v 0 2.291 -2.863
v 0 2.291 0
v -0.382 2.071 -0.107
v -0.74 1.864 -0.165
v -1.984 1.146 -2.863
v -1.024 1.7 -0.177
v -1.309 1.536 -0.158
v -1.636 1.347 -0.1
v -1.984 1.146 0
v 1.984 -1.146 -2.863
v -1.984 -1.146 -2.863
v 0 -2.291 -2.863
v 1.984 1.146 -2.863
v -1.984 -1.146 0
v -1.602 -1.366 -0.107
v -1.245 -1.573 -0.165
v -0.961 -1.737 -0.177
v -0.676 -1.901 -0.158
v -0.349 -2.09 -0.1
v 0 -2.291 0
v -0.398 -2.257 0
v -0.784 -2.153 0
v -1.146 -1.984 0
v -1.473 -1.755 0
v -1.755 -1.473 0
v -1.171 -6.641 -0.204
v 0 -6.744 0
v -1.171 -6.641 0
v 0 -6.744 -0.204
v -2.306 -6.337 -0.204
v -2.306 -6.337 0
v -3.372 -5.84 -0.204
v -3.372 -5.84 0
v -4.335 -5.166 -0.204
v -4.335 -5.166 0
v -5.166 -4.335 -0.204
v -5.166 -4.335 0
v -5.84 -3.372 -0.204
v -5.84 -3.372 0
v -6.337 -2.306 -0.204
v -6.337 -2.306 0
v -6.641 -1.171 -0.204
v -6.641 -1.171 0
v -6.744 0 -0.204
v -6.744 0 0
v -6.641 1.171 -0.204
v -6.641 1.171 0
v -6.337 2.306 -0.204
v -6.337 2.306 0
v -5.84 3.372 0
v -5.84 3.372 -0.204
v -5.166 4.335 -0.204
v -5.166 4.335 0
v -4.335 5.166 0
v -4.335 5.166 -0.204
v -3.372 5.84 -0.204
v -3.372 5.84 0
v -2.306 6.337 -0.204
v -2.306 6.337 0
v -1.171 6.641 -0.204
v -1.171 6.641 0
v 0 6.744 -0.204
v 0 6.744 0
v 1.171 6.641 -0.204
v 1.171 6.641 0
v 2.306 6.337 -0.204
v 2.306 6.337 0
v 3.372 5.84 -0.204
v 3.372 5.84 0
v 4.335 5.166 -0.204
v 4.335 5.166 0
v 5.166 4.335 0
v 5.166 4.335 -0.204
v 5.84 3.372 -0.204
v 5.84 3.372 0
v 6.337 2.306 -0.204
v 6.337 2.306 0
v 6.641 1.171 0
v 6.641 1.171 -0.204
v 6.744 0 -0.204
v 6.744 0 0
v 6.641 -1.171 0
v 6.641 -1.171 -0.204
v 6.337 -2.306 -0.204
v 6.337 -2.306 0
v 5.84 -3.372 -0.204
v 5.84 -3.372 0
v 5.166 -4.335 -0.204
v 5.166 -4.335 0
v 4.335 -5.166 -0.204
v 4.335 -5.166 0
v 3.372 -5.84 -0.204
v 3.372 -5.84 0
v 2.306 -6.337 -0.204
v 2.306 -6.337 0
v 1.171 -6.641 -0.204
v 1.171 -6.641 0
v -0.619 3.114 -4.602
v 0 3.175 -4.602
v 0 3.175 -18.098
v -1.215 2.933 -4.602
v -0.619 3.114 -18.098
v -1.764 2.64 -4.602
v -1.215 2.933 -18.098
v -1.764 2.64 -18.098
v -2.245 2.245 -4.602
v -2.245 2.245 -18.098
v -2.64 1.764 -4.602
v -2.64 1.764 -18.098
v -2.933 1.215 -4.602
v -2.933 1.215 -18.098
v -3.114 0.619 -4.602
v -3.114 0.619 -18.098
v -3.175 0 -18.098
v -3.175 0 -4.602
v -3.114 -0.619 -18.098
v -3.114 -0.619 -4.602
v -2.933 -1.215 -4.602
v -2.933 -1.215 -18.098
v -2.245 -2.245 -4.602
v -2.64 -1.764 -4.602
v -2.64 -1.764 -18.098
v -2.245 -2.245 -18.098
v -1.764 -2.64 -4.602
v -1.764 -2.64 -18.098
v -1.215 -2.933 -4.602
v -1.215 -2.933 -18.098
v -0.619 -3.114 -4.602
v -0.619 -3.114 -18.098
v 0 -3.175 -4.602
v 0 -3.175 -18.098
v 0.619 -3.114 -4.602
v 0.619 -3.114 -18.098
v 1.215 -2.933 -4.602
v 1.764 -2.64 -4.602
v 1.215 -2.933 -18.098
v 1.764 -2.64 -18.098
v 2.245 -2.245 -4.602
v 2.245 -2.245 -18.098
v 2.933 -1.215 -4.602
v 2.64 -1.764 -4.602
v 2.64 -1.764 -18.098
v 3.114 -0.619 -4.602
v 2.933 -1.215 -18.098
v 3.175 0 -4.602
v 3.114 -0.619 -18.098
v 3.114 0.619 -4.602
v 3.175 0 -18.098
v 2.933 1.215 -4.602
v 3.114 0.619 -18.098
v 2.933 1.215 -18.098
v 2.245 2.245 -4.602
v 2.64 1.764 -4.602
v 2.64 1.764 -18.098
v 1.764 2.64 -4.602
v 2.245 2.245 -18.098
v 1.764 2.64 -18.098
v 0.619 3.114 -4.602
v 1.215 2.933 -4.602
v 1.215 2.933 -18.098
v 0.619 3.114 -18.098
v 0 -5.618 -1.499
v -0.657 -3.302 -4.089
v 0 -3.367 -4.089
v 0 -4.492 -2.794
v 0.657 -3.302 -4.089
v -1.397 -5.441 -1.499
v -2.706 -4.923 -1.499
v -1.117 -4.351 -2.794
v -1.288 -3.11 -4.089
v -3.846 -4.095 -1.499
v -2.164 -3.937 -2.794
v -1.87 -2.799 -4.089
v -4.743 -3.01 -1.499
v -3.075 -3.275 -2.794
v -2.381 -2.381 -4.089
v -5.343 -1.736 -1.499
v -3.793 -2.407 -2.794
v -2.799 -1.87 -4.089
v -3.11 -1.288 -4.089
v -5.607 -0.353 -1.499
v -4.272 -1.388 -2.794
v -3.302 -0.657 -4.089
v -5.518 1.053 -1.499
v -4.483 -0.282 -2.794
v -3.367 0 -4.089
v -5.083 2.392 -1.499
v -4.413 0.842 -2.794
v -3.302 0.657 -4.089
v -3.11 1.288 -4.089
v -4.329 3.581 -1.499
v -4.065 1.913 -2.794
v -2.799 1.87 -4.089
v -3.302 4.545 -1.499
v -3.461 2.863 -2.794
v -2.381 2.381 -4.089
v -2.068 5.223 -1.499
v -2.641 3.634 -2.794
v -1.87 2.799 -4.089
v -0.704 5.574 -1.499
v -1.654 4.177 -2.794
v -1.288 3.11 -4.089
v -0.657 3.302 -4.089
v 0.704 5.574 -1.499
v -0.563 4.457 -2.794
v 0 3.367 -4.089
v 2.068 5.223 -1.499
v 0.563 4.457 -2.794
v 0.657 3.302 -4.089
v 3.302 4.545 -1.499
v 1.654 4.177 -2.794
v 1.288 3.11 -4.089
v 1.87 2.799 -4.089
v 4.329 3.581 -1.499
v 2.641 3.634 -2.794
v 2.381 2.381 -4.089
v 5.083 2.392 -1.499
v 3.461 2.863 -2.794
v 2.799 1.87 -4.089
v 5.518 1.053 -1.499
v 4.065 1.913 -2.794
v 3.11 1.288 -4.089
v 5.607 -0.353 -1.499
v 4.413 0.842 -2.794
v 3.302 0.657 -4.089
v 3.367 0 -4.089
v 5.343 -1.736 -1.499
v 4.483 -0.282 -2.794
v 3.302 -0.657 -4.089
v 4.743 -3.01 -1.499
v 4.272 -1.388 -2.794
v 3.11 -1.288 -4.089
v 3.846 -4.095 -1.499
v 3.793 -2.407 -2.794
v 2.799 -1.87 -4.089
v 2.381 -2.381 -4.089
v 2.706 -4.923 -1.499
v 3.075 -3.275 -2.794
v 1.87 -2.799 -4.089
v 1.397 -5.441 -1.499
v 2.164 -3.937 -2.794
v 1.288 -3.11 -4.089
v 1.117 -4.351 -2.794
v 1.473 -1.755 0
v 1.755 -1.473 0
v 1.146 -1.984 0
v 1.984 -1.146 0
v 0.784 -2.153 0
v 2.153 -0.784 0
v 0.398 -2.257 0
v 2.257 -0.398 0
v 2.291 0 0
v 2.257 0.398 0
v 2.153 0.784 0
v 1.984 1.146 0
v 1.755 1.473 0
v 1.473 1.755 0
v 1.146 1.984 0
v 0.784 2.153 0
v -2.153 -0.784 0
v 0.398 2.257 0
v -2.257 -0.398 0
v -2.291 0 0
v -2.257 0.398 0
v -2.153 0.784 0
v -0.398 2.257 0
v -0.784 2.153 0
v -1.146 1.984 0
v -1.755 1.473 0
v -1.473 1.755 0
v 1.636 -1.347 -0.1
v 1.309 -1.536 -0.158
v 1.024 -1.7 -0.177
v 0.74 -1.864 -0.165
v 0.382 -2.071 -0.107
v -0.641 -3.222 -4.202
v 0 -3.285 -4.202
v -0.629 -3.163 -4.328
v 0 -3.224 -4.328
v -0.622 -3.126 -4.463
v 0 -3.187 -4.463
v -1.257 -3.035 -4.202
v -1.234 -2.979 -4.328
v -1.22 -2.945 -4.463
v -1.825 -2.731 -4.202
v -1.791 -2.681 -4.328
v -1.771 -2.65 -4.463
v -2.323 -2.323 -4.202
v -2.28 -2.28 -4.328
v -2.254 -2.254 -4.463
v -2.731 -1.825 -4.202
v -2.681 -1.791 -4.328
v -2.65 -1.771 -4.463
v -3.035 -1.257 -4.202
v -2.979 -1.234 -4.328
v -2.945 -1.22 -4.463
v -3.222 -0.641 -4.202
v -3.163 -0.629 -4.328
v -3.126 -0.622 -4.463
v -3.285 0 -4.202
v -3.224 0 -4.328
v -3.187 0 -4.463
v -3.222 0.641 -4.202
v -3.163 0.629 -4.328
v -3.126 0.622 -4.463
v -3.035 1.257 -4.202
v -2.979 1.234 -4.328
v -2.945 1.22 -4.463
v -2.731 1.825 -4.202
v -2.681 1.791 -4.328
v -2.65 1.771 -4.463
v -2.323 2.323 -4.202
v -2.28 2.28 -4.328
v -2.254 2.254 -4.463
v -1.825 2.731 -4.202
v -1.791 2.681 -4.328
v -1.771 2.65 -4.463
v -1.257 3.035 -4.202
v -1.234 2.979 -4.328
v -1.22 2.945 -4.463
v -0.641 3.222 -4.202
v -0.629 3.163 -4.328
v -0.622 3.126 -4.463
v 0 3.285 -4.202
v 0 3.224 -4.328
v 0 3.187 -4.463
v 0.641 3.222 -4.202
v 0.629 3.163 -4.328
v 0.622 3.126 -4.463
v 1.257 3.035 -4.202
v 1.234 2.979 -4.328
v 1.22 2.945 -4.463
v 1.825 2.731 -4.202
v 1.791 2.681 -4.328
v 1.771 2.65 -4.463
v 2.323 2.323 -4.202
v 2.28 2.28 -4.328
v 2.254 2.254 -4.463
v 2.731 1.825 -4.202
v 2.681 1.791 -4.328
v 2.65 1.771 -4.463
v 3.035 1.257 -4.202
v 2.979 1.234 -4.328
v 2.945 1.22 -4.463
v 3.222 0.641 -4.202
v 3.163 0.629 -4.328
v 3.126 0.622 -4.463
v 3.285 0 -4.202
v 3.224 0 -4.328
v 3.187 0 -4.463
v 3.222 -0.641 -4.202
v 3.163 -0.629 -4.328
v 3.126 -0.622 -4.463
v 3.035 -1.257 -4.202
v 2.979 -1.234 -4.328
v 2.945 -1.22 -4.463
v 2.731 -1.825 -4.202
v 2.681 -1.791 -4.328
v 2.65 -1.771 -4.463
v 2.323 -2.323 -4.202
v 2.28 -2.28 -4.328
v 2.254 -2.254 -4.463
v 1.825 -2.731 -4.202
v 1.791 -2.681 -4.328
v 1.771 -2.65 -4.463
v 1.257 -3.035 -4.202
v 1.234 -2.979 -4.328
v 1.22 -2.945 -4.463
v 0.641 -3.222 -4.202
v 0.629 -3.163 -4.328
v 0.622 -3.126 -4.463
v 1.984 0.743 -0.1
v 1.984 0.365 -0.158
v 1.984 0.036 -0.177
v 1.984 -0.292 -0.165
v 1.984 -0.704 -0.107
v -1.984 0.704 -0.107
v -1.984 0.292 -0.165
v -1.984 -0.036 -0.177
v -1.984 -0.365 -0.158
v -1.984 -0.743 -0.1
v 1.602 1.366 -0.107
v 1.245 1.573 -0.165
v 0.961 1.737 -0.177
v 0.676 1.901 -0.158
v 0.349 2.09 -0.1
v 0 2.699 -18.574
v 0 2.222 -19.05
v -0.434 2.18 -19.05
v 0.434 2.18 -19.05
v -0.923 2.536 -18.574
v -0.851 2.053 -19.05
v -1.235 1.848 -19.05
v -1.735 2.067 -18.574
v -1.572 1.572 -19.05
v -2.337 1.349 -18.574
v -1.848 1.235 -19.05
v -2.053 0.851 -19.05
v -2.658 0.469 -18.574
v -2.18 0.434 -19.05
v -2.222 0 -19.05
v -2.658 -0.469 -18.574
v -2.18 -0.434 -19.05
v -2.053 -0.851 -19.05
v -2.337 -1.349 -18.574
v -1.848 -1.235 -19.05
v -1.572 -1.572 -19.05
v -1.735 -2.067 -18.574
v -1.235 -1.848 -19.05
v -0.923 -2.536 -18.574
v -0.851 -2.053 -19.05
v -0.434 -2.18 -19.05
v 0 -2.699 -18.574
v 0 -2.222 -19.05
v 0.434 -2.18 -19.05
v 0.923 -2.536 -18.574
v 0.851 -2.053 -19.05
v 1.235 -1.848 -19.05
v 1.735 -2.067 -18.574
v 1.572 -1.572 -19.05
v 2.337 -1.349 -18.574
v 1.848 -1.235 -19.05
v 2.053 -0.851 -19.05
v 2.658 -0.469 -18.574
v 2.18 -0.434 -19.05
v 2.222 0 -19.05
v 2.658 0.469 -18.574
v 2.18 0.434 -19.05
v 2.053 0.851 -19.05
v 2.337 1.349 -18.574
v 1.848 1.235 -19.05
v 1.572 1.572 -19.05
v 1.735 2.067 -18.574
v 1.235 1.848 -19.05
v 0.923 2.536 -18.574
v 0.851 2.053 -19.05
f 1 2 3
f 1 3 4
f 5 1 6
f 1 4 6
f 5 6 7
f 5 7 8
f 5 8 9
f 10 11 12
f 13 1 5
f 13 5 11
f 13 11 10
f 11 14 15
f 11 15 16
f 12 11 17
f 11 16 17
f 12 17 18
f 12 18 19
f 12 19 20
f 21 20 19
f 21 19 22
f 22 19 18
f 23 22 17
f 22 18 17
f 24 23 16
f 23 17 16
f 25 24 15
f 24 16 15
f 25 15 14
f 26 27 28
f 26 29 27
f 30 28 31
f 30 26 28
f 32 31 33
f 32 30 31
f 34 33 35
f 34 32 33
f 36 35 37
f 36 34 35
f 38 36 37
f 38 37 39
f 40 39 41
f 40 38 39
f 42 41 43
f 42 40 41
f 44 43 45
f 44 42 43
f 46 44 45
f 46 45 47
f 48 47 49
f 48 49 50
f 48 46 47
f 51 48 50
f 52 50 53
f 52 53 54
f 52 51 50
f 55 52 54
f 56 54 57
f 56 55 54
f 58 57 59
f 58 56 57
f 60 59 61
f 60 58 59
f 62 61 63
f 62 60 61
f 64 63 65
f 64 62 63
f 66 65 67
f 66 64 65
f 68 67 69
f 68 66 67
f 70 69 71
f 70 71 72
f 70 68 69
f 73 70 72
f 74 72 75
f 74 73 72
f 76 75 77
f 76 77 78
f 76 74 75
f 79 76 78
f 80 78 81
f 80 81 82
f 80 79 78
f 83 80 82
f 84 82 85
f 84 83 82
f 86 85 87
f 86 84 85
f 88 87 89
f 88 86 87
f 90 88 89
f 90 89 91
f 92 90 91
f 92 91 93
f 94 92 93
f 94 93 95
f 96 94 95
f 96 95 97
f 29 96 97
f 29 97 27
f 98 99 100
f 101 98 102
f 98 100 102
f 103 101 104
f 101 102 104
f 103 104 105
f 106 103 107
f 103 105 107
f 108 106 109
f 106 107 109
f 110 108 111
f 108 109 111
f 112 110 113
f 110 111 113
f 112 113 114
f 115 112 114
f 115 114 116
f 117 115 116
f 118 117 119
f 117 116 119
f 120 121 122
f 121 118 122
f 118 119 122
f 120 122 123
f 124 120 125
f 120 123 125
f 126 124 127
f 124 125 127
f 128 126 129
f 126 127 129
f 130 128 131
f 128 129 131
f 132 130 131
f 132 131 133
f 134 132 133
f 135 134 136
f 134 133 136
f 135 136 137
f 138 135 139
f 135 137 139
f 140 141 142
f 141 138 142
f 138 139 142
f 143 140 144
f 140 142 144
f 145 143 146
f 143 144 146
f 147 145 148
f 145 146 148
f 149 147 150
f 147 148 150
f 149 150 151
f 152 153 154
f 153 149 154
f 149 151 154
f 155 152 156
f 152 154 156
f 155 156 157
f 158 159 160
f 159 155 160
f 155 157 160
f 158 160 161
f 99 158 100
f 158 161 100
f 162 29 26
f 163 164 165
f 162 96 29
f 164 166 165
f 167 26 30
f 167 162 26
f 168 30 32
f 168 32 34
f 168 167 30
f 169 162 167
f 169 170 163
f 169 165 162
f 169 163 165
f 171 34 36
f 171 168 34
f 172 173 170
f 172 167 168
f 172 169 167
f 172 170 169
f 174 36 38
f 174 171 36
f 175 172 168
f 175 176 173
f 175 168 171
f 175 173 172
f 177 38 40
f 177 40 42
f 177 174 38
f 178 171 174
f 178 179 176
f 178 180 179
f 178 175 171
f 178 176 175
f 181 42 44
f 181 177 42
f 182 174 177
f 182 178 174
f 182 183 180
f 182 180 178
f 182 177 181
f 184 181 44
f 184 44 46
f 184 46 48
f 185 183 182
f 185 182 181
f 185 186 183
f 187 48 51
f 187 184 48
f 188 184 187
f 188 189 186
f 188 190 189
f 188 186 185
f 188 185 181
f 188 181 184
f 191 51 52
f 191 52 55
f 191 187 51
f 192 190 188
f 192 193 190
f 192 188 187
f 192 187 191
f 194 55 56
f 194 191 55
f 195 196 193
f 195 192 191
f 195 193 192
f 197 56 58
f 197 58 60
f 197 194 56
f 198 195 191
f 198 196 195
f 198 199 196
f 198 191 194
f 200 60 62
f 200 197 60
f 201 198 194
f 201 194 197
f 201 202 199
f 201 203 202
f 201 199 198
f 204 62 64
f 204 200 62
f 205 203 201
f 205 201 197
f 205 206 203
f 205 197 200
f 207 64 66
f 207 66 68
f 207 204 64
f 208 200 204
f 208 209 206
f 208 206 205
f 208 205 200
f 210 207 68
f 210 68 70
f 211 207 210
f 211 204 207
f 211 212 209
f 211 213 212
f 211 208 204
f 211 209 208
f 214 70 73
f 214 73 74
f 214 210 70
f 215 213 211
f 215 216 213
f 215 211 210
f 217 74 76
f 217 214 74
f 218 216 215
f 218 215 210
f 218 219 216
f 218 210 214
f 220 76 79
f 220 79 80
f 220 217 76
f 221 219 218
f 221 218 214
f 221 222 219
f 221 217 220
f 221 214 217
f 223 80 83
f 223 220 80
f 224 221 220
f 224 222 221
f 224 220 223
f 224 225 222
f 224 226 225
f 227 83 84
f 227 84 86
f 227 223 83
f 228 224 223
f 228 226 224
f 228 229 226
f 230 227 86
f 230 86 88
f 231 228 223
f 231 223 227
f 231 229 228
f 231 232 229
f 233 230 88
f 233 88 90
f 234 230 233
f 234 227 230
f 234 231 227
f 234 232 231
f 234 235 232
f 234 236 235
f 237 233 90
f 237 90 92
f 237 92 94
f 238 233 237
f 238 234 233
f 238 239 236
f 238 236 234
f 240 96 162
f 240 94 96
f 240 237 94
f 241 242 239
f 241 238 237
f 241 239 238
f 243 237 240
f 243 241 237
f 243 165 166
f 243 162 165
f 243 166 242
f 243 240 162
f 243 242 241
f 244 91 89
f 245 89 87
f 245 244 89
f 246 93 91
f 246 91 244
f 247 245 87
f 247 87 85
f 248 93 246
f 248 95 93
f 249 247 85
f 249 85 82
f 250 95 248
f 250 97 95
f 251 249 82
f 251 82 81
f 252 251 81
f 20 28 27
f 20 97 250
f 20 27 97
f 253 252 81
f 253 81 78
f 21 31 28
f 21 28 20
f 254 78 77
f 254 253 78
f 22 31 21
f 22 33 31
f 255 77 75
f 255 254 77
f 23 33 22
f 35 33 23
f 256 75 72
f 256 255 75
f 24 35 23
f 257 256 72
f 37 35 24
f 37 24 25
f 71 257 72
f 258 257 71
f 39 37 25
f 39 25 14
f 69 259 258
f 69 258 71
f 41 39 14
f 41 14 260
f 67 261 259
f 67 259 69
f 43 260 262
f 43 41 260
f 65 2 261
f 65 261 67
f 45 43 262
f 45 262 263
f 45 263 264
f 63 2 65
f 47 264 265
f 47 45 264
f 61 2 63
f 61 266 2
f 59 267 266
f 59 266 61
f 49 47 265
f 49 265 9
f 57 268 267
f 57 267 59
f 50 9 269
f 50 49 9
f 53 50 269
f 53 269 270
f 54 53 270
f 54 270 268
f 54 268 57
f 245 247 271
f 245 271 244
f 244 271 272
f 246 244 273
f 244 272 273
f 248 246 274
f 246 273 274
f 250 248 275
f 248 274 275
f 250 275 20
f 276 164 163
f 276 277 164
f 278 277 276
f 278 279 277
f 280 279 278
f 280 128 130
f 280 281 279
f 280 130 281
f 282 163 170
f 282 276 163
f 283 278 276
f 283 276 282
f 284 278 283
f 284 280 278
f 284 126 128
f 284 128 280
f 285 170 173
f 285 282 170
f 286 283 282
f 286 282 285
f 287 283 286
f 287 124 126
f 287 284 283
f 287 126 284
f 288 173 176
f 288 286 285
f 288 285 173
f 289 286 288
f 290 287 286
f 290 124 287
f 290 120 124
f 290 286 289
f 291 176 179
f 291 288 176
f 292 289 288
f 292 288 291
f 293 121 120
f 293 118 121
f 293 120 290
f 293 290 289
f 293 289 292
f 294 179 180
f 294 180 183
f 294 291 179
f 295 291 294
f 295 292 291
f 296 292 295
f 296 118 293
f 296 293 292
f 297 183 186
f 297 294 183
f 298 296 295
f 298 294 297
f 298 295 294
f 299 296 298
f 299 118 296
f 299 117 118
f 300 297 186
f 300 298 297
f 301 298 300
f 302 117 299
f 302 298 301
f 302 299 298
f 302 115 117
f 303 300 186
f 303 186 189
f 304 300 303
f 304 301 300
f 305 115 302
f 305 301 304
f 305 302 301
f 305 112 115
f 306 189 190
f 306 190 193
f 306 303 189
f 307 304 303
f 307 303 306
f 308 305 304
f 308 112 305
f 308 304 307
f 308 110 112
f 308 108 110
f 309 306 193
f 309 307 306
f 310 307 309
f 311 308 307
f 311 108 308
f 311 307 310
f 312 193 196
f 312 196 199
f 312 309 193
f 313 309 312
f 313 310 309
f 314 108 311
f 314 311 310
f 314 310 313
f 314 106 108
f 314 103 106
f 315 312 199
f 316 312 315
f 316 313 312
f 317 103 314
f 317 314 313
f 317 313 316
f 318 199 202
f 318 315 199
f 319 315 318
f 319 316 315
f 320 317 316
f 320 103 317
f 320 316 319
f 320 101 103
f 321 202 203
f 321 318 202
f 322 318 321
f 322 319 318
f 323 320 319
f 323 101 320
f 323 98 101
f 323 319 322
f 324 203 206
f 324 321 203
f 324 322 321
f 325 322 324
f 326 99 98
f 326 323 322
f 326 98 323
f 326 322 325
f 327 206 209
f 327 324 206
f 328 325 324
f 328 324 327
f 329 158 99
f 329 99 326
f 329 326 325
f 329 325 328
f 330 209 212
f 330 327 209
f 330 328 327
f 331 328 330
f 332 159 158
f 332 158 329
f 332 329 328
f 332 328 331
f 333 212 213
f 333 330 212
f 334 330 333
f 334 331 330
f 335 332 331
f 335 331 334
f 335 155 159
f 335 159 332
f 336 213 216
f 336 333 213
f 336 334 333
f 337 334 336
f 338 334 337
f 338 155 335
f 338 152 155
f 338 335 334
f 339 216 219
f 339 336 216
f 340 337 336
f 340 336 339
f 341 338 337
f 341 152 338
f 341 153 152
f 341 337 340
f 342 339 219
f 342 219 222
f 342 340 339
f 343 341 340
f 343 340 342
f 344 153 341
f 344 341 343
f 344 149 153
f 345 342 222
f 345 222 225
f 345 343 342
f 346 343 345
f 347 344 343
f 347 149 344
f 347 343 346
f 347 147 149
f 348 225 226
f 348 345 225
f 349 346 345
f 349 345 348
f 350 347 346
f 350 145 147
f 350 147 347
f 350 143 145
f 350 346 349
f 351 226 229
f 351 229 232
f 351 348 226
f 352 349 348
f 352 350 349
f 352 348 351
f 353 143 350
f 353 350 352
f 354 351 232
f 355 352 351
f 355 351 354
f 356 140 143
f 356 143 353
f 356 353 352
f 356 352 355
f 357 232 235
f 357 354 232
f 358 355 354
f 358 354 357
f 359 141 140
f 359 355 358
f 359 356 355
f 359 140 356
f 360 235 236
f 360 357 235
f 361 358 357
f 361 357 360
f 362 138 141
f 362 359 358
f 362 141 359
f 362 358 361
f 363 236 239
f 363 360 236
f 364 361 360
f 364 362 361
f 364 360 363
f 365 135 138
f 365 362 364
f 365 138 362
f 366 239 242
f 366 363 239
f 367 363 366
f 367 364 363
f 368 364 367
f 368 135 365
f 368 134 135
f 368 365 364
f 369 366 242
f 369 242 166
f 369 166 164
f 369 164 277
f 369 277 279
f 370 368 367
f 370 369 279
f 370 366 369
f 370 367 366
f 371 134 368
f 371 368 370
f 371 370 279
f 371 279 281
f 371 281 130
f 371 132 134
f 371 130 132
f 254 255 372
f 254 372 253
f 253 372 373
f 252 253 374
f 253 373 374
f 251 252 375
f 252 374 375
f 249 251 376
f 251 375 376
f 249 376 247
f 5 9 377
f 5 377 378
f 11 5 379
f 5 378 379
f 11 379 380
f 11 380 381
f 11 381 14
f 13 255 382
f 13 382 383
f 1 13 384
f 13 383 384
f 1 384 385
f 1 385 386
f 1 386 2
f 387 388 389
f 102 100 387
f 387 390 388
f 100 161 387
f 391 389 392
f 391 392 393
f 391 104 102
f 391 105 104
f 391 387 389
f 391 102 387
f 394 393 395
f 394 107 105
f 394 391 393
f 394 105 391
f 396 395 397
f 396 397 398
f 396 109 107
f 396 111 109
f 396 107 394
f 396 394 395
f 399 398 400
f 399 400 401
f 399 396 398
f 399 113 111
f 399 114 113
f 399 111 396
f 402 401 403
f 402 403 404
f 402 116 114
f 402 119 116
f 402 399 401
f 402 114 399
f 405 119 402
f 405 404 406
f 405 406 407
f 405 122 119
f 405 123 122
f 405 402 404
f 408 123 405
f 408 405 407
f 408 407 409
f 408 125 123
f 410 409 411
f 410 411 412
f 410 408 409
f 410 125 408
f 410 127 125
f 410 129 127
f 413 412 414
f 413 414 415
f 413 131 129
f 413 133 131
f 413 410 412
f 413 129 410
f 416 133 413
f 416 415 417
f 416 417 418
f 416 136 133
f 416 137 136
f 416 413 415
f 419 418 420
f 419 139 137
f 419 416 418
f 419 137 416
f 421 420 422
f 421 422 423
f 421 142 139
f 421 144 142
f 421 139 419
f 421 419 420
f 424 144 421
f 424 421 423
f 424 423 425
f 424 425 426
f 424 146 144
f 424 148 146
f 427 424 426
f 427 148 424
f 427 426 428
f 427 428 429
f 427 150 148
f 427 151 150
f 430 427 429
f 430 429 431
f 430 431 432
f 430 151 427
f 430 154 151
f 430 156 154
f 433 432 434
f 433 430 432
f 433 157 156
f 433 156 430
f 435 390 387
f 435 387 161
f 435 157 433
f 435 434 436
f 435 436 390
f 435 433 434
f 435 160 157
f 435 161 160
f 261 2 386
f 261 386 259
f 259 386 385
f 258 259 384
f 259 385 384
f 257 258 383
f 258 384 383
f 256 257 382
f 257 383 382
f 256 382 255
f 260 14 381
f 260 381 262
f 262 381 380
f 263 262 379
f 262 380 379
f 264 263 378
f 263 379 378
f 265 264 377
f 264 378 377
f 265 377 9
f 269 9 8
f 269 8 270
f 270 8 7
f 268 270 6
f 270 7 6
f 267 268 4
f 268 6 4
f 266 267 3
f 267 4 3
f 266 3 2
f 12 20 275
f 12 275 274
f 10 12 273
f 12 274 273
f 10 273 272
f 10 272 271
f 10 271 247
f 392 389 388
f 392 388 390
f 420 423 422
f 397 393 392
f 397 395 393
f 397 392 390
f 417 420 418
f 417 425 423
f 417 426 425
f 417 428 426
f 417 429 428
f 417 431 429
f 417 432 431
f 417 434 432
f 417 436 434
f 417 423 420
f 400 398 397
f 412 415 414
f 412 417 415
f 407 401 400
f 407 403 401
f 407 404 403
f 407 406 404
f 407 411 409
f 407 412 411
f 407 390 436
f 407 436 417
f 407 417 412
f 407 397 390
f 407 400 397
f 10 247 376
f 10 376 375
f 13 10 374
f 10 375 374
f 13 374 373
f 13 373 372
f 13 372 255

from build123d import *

# Parameters (mm, degrees)
SKETCH1_W          = 19.05
SKETCH1_H          = 3.175
CHAMFER1_SIZE      = 0.9525
CUT_EXTRUDE2_DEPTH = 2.86258


with BuildPart() as part:
    # Sketch1 → Revolve1 (revolve)
    with BuildSketch(Plane(origin=(0, 0, 0), x_dir=(0, 0, -1), z_dir=(1, 0, 0))):
        with Locations((9.525, 1.5875)):
            Rectangle(SKETCH1_W, SKETCH1_H)
    revolve(axis=Axis((0, 0, -19.05), (0, 0, 1)))

    # Chamfer1
    chamfer1_edges = [part.edges().sort_by_distance(p)[0] for p in [
        (0, -3.175, -19.05),
    ]]
    chamfer(chamfer1_edges, length=CHAMFER1_SIZE)

    # Sketch7 → Revolve2 (revolve)
    with BuildSketch(Plane(origin=(0, 0, 0), x_dir=(0, 0, -1), z_dir=(1, 0, 0)), mode=Mode.PRIVATE) as revolve2_sk:
        with BuildLine():
            Line((0, 6.7437), (0.20447, 6.7437))
            Line((0.20447, 6.7437), (4.0894, 3.366581874))
            ThreePointArc((4.0894, 3.366581874), (4.328282675, 3.224461616), (4.601808997, 3.175))
            Line((4.601808997, 3.175), (4.601808997, 0))
            Line((4.601808997, 0), (0, 0))
            Line((0, 0), (0, 6.7437))
        make_face()
    revolve(revolve2_sk.sketch.rotate(Axis((0, 0, 0), (0, 0, -1)), 180), axis=Axis((0, 0, 0), (0, 0, -1)))

    # Boss-Extrude1 cone 1 section (through the dimple's axis) → Boss-Extrude1 (revolve)
    with BuildSketch(Plane(origin=(0, 0, -4.601808997), x_dir=(0, -1, 0), z_dir=(1, 0, 0))):
        Polygon((0, 0), (3.175, 0), (0, 3.06606186), align=None)
    revolve(axis=Axis((0, 0, -4.601808997), (0, 0, -1)))

    # Sketch5 → Cut-Extrude2 (cut)
    with BuildSketch(Plane.XY):
        Polygon((0, 2.291358881), (-1.984375, 1.14567944), (-1.984375, -1.14567944), (0, -2.291358881), (1.984375, -1.14567944), (1.984375, 1.14567944), align=None)
    extrude(amount=-CUT_EXTRUDE2_DEPTH, mode=Mode.SUBTRACT)

    # Cut-Extrude3 cone 1 section (through the dimple's axis) → Cut-Extrude3 (revolve, cut)
    with BuildSketch(Plane(origin=(0, 0, 0), x_dir=(0, -1, 0), z_dir=(1, 0, 0))):
        Polygon((0, 0), (2.291358881, 0), (0, 1.322916667), align=None)
    revolve(axis=Axis((0, 0, 0), (0, 0, -1)), mode=Mode.SUBTRACT)


solid = part.part
